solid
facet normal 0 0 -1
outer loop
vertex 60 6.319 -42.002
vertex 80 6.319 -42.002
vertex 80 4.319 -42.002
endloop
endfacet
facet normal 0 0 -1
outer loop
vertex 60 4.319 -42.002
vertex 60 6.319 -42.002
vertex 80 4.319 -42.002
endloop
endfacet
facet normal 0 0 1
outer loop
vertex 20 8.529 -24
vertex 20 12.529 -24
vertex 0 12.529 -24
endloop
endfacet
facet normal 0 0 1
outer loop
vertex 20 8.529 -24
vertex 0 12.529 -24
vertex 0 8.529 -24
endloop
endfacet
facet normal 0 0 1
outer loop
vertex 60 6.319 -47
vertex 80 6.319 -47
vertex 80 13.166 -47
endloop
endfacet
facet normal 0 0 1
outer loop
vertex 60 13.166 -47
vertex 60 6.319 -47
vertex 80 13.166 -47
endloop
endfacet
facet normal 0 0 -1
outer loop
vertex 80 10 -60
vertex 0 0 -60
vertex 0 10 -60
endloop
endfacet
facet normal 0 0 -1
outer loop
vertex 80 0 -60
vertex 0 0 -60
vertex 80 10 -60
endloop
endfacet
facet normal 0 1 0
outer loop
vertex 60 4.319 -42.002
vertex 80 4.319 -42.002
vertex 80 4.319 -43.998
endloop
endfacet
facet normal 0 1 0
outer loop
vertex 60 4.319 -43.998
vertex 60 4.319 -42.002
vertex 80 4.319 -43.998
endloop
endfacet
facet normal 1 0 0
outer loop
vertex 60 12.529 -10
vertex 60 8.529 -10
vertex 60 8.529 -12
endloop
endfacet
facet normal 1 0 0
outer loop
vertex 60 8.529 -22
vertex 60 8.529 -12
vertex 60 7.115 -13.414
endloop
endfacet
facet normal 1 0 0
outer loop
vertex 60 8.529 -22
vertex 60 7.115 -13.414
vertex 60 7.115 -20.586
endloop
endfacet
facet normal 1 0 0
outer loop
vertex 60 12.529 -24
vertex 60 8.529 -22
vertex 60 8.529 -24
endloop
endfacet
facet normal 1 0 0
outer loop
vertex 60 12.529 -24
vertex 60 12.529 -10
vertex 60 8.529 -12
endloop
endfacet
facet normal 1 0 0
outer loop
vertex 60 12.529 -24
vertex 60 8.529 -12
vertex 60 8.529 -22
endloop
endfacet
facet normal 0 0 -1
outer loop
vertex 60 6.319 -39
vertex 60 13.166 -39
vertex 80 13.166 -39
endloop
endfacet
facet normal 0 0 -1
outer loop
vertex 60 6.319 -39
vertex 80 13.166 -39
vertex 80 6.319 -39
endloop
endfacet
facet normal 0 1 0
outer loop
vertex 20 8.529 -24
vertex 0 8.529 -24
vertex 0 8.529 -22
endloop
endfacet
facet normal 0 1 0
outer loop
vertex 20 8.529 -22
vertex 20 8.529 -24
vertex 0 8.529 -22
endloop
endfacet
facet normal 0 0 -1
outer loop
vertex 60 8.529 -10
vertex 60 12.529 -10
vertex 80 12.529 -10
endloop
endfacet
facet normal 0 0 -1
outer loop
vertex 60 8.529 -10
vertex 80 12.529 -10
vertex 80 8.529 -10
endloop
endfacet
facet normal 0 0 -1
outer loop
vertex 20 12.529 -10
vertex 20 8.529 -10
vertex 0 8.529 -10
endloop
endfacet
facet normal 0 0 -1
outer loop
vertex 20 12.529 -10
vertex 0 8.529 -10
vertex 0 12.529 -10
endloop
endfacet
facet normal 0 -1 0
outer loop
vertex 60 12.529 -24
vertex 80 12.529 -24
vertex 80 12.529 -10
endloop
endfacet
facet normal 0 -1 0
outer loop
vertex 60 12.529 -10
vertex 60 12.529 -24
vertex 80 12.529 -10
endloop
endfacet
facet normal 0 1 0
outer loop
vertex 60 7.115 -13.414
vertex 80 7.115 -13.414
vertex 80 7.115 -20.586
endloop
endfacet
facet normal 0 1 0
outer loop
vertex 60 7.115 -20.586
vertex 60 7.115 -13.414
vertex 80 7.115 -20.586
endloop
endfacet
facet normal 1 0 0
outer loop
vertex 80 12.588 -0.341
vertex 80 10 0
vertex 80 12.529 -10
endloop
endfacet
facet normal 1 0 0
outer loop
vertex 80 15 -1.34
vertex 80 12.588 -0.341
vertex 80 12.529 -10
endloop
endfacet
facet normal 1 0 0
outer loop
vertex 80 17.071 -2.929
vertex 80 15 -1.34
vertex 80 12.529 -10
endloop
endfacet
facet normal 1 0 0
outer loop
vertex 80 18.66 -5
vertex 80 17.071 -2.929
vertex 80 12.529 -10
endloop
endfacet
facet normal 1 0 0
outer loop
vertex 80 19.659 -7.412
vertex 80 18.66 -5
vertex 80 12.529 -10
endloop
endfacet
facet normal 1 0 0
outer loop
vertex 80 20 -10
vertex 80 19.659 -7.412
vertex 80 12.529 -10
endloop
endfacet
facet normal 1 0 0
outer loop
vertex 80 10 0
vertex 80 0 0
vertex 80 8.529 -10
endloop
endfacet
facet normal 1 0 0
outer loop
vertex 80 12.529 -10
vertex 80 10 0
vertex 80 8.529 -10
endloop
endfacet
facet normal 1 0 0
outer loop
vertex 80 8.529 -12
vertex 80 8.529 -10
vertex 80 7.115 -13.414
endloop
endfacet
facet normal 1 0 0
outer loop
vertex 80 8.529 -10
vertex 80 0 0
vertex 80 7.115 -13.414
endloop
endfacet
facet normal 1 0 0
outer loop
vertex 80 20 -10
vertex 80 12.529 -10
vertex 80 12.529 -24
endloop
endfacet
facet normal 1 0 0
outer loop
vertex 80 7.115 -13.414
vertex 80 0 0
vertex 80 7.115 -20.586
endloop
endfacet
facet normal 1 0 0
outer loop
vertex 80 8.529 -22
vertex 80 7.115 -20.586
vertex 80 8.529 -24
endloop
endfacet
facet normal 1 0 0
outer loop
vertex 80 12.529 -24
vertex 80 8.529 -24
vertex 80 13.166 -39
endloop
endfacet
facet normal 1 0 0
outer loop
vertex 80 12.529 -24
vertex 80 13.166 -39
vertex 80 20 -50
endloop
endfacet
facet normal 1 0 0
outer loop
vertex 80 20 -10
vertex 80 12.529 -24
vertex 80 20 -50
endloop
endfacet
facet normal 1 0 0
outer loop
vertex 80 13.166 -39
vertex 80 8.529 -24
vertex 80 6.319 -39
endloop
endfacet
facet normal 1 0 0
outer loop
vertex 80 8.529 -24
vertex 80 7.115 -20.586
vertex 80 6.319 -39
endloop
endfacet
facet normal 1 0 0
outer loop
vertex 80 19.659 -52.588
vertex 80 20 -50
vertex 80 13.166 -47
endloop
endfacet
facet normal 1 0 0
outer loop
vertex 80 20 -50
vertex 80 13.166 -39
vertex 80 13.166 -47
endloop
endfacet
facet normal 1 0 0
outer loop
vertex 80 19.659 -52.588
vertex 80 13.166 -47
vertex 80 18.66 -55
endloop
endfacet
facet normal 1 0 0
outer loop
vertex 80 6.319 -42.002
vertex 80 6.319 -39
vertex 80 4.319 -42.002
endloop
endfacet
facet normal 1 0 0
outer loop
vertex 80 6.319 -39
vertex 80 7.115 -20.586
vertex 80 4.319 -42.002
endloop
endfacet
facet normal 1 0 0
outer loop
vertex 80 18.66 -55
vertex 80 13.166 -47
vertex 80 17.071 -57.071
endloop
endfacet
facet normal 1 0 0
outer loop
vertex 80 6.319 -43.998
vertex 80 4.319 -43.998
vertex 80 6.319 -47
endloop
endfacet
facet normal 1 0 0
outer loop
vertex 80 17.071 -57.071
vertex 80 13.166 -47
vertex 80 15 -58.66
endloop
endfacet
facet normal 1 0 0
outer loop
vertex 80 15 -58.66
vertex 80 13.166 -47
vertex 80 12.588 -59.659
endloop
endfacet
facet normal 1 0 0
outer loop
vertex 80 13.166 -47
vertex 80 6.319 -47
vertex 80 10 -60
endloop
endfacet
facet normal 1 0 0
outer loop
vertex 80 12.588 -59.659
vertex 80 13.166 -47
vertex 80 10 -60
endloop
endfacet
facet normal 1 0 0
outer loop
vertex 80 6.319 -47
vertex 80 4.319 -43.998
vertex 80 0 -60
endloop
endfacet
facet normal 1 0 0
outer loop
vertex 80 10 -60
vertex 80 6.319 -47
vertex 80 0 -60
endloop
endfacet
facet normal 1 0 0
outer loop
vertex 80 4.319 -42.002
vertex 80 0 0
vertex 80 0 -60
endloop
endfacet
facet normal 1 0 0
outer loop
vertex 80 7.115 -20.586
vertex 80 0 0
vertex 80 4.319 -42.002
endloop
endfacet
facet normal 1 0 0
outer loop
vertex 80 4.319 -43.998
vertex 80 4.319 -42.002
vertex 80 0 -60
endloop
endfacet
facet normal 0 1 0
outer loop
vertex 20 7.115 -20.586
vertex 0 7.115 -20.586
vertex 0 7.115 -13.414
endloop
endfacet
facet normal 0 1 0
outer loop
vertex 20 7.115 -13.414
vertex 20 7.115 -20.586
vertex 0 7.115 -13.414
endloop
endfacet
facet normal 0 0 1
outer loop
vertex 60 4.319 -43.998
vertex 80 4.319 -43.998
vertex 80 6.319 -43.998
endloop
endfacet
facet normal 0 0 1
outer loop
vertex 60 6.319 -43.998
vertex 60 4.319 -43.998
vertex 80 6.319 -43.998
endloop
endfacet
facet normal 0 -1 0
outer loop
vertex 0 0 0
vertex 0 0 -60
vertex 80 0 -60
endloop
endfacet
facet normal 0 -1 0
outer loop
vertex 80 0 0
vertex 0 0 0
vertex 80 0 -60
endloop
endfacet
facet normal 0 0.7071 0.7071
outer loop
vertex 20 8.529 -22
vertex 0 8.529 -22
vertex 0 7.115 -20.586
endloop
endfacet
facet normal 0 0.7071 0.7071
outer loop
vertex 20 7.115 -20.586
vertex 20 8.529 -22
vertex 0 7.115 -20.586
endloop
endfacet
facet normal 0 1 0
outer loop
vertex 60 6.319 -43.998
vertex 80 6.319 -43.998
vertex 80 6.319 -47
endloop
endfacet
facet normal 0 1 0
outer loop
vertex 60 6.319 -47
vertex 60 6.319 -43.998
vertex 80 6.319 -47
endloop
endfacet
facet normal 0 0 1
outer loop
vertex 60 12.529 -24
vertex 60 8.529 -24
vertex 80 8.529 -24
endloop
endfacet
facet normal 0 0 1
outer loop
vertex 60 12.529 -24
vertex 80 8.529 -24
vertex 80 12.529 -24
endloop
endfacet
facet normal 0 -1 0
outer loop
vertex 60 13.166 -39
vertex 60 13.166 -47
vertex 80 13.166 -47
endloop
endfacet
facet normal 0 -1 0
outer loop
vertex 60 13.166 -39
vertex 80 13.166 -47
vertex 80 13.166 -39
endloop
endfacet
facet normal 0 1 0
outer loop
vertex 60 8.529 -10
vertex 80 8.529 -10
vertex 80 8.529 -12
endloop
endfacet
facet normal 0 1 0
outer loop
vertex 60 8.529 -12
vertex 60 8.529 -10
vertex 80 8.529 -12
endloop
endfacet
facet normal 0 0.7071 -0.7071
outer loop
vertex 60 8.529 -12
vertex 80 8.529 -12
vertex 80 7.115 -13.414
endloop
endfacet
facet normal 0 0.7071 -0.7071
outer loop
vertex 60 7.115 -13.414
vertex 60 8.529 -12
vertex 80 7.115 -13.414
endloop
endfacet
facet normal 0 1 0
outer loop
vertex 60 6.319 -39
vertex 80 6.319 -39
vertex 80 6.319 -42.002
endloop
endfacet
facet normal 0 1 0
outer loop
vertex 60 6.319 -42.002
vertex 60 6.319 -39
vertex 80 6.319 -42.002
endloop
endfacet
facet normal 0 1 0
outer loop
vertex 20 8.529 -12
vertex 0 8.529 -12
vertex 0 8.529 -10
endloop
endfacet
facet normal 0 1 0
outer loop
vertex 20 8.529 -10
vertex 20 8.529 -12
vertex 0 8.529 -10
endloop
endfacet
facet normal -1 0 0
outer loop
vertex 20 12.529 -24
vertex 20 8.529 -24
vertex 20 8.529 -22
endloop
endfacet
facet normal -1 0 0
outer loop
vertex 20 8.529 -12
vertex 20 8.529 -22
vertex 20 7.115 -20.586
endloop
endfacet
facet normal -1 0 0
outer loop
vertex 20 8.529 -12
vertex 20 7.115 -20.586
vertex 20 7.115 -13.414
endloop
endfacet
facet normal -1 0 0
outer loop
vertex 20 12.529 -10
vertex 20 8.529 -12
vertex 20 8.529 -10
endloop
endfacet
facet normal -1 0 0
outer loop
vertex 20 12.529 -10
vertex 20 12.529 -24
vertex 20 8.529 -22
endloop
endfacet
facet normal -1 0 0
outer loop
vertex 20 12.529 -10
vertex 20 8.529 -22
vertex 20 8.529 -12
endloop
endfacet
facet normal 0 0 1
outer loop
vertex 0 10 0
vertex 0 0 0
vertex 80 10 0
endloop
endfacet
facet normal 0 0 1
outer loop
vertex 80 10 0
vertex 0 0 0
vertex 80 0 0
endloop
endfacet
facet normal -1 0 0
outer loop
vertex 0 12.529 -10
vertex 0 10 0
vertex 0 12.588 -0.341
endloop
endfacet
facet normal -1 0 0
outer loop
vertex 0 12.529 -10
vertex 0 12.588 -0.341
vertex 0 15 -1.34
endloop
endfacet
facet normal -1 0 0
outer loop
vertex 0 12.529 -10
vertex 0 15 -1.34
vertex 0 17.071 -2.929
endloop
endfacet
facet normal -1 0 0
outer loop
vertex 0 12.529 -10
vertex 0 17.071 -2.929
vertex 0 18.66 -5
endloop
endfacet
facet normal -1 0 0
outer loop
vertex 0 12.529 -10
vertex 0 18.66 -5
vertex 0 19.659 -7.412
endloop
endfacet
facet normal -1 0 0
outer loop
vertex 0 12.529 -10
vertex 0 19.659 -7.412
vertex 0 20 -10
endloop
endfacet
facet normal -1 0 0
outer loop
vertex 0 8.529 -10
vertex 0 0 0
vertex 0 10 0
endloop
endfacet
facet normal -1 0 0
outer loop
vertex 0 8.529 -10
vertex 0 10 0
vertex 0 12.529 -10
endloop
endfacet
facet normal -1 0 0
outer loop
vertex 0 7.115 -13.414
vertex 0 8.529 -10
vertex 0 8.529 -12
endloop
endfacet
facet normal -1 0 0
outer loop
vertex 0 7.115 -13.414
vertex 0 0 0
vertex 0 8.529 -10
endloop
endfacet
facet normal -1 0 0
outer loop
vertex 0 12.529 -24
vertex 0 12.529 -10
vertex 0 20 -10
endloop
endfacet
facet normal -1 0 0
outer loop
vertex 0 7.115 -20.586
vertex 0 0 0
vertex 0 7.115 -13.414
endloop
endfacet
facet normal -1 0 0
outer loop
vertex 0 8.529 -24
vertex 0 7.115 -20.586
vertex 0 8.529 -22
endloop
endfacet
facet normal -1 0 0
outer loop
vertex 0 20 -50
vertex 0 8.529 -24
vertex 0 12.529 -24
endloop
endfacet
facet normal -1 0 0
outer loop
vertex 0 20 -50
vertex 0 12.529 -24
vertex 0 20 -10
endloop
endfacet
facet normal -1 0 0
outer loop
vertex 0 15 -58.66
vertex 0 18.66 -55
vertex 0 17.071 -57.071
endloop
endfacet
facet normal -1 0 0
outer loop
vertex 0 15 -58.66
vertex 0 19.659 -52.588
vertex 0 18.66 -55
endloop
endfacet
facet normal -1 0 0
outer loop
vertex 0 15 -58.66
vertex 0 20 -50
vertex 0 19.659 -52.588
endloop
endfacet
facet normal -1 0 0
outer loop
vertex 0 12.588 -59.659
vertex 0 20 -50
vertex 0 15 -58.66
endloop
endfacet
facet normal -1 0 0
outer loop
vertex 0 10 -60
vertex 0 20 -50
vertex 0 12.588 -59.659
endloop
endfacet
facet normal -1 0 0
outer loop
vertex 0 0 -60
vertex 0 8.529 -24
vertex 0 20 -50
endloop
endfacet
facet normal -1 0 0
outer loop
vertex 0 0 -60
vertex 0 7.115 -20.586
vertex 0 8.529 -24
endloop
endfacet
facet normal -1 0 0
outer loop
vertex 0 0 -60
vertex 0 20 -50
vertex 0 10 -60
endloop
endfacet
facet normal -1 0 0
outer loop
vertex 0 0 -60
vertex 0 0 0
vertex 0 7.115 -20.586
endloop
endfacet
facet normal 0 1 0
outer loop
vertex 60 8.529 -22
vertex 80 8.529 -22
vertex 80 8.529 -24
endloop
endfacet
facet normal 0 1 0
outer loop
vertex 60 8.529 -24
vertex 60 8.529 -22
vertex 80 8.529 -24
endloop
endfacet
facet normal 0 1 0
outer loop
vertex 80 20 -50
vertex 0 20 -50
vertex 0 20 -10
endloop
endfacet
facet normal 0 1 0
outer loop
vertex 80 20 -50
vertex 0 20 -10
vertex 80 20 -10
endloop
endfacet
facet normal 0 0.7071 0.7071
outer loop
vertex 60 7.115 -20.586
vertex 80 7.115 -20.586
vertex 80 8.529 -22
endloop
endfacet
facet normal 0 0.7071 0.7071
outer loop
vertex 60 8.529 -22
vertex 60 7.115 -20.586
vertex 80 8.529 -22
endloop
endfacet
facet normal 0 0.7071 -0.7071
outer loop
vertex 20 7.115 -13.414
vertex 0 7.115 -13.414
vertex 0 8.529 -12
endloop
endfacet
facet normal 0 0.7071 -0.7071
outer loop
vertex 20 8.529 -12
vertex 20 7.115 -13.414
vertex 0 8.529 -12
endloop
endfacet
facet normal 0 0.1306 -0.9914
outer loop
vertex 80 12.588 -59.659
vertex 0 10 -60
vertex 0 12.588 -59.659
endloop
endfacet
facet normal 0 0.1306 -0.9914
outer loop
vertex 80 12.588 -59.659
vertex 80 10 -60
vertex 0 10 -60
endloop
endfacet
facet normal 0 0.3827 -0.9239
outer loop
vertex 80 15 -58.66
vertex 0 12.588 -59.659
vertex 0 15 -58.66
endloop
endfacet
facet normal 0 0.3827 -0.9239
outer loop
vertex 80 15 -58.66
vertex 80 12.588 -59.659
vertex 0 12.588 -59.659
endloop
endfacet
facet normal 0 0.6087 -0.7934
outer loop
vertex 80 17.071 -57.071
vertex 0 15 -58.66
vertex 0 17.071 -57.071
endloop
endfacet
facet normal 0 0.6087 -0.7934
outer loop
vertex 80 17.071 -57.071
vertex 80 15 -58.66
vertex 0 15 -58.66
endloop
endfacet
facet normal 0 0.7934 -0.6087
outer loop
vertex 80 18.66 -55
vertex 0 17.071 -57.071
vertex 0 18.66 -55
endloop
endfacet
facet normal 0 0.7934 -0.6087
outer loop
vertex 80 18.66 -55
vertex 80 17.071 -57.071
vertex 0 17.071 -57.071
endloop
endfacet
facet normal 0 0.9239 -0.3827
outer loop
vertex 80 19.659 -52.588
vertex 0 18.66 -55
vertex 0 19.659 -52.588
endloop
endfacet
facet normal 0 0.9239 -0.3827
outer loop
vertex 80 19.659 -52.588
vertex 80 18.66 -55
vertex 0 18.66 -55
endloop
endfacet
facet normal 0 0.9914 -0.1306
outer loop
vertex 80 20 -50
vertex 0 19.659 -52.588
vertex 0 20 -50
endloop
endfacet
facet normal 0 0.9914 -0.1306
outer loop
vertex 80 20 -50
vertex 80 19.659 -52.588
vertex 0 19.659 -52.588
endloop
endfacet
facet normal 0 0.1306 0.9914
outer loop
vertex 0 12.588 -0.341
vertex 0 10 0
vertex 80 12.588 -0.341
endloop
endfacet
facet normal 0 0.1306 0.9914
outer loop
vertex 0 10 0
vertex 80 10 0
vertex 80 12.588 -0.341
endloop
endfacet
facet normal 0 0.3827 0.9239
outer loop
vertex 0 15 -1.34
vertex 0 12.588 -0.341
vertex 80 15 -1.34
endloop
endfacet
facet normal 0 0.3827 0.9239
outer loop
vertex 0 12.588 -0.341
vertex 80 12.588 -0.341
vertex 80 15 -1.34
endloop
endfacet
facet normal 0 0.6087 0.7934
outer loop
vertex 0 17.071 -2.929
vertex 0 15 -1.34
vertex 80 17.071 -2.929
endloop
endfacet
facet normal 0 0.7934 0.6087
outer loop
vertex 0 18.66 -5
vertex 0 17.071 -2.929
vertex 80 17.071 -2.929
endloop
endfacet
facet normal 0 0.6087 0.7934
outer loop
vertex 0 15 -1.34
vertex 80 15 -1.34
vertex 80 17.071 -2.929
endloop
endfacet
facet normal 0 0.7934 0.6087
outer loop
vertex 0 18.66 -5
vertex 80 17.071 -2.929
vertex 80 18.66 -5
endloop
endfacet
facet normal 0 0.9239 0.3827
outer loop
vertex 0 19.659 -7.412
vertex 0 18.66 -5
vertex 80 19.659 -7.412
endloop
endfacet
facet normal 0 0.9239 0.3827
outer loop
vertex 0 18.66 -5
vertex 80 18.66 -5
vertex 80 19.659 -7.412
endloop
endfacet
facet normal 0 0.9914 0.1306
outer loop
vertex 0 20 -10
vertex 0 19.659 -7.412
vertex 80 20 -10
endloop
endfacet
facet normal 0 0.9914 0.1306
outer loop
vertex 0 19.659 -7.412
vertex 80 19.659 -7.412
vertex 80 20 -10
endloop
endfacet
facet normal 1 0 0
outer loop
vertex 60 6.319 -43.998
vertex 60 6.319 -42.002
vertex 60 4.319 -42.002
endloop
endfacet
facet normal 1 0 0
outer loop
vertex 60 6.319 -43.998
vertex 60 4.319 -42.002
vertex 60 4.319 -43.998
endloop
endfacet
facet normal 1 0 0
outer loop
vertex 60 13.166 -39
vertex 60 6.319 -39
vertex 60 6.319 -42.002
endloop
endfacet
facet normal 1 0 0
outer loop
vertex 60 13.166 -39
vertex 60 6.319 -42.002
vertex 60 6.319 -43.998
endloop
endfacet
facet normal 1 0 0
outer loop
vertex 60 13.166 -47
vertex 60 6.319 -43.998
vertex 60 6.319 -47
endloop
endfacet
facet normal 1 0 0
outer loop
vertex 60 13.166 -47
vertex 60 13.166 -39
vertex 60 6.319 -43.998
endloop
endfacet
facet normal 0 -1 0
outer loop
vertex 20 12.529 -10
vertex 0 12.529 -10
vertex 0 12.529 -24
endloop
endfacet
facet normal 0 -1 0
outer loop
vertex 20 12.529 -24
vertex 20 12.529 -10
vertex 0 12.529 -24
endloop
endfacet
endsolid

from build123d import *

# Parameters (mm, degrees)
CROQUIS1_W              = 80
CROQUIS1_H              = 60
SALIENTE_EXTRUIR1_DEPTH = 20
CORTAR_EXTRUIR1_DEPTH   = 20
REDONDEO1_R             = 10
CORTAR_EXTRUIR2_DEPTH   = 20


with BuildPart() as part:
    # Croquis1 → Saliente-Extruir1 (new body)
    with BuildSketch(Plane(origin=(0, 0, 0), x_dir=(1, 0, 0), z_dir=(0, 1, 0))):
        with Locations((40, 30)):
            Rectangle(CROQUIS1_W, CROQUIS1_H)
    extrude(amount=SALIENTE_EXTRUIR1_DEPTH)

    # Croquis2 → Cortar-Extruir1 (cut)
    with BuildSketch(Plane(origin=(80, 0, 0), x_dir=(0, 0, -1), z_dir=(1, 0, 0))):
        Polygon((10, 12.52909884), (10, 8.52909884), (12, 8.52909884), (13.414213562, 7.114885277), (20.585786438, 7.114885277), (22, 8.52909884), (24, 8.52909884), (24, 12.52909884), align=None)
        Polygon((43.998137674, 6.318837227), (47, 6.318837227), (47, 13.165528149), (39, 13.165528149), (39, 6.318837227), (42.001862326, 6.318837227), (42.001862326, 4.318837227), (43.998137674, 4.318837227), align=None)
    extrude(amount=-CORTAR_EXTRUIR1_DEPTH, mode=Mode.SUBTRACT)

    # Redondeo1
    redondeo1_edges = [part.edges().sort_by_distance(p)[0] for p in [
        (40, 20, -60),
        (40, 20, 0),
    ]]
    fillet(redondeo1_edges, radius=REDONDEO1_R)

    # Croquis3 → Cortar-Extruir2 (cut)
    with BuildSketch(Plane.ZY):
        Polygon((-10, 12.52909884), (-24, 12.52909884), (-24, 8.52909884), (-22, 8.52909884), (-20.585786438, 7.114885277), (-13.414213562, 7.114885277), (-12, 8.52909884), (-10, 8.52909884), align=None)
    extrude(amount=-CORTAR_EXTRUIR2_DEPTH, mode=Mode.SUBTRACT)


solid = part.part
